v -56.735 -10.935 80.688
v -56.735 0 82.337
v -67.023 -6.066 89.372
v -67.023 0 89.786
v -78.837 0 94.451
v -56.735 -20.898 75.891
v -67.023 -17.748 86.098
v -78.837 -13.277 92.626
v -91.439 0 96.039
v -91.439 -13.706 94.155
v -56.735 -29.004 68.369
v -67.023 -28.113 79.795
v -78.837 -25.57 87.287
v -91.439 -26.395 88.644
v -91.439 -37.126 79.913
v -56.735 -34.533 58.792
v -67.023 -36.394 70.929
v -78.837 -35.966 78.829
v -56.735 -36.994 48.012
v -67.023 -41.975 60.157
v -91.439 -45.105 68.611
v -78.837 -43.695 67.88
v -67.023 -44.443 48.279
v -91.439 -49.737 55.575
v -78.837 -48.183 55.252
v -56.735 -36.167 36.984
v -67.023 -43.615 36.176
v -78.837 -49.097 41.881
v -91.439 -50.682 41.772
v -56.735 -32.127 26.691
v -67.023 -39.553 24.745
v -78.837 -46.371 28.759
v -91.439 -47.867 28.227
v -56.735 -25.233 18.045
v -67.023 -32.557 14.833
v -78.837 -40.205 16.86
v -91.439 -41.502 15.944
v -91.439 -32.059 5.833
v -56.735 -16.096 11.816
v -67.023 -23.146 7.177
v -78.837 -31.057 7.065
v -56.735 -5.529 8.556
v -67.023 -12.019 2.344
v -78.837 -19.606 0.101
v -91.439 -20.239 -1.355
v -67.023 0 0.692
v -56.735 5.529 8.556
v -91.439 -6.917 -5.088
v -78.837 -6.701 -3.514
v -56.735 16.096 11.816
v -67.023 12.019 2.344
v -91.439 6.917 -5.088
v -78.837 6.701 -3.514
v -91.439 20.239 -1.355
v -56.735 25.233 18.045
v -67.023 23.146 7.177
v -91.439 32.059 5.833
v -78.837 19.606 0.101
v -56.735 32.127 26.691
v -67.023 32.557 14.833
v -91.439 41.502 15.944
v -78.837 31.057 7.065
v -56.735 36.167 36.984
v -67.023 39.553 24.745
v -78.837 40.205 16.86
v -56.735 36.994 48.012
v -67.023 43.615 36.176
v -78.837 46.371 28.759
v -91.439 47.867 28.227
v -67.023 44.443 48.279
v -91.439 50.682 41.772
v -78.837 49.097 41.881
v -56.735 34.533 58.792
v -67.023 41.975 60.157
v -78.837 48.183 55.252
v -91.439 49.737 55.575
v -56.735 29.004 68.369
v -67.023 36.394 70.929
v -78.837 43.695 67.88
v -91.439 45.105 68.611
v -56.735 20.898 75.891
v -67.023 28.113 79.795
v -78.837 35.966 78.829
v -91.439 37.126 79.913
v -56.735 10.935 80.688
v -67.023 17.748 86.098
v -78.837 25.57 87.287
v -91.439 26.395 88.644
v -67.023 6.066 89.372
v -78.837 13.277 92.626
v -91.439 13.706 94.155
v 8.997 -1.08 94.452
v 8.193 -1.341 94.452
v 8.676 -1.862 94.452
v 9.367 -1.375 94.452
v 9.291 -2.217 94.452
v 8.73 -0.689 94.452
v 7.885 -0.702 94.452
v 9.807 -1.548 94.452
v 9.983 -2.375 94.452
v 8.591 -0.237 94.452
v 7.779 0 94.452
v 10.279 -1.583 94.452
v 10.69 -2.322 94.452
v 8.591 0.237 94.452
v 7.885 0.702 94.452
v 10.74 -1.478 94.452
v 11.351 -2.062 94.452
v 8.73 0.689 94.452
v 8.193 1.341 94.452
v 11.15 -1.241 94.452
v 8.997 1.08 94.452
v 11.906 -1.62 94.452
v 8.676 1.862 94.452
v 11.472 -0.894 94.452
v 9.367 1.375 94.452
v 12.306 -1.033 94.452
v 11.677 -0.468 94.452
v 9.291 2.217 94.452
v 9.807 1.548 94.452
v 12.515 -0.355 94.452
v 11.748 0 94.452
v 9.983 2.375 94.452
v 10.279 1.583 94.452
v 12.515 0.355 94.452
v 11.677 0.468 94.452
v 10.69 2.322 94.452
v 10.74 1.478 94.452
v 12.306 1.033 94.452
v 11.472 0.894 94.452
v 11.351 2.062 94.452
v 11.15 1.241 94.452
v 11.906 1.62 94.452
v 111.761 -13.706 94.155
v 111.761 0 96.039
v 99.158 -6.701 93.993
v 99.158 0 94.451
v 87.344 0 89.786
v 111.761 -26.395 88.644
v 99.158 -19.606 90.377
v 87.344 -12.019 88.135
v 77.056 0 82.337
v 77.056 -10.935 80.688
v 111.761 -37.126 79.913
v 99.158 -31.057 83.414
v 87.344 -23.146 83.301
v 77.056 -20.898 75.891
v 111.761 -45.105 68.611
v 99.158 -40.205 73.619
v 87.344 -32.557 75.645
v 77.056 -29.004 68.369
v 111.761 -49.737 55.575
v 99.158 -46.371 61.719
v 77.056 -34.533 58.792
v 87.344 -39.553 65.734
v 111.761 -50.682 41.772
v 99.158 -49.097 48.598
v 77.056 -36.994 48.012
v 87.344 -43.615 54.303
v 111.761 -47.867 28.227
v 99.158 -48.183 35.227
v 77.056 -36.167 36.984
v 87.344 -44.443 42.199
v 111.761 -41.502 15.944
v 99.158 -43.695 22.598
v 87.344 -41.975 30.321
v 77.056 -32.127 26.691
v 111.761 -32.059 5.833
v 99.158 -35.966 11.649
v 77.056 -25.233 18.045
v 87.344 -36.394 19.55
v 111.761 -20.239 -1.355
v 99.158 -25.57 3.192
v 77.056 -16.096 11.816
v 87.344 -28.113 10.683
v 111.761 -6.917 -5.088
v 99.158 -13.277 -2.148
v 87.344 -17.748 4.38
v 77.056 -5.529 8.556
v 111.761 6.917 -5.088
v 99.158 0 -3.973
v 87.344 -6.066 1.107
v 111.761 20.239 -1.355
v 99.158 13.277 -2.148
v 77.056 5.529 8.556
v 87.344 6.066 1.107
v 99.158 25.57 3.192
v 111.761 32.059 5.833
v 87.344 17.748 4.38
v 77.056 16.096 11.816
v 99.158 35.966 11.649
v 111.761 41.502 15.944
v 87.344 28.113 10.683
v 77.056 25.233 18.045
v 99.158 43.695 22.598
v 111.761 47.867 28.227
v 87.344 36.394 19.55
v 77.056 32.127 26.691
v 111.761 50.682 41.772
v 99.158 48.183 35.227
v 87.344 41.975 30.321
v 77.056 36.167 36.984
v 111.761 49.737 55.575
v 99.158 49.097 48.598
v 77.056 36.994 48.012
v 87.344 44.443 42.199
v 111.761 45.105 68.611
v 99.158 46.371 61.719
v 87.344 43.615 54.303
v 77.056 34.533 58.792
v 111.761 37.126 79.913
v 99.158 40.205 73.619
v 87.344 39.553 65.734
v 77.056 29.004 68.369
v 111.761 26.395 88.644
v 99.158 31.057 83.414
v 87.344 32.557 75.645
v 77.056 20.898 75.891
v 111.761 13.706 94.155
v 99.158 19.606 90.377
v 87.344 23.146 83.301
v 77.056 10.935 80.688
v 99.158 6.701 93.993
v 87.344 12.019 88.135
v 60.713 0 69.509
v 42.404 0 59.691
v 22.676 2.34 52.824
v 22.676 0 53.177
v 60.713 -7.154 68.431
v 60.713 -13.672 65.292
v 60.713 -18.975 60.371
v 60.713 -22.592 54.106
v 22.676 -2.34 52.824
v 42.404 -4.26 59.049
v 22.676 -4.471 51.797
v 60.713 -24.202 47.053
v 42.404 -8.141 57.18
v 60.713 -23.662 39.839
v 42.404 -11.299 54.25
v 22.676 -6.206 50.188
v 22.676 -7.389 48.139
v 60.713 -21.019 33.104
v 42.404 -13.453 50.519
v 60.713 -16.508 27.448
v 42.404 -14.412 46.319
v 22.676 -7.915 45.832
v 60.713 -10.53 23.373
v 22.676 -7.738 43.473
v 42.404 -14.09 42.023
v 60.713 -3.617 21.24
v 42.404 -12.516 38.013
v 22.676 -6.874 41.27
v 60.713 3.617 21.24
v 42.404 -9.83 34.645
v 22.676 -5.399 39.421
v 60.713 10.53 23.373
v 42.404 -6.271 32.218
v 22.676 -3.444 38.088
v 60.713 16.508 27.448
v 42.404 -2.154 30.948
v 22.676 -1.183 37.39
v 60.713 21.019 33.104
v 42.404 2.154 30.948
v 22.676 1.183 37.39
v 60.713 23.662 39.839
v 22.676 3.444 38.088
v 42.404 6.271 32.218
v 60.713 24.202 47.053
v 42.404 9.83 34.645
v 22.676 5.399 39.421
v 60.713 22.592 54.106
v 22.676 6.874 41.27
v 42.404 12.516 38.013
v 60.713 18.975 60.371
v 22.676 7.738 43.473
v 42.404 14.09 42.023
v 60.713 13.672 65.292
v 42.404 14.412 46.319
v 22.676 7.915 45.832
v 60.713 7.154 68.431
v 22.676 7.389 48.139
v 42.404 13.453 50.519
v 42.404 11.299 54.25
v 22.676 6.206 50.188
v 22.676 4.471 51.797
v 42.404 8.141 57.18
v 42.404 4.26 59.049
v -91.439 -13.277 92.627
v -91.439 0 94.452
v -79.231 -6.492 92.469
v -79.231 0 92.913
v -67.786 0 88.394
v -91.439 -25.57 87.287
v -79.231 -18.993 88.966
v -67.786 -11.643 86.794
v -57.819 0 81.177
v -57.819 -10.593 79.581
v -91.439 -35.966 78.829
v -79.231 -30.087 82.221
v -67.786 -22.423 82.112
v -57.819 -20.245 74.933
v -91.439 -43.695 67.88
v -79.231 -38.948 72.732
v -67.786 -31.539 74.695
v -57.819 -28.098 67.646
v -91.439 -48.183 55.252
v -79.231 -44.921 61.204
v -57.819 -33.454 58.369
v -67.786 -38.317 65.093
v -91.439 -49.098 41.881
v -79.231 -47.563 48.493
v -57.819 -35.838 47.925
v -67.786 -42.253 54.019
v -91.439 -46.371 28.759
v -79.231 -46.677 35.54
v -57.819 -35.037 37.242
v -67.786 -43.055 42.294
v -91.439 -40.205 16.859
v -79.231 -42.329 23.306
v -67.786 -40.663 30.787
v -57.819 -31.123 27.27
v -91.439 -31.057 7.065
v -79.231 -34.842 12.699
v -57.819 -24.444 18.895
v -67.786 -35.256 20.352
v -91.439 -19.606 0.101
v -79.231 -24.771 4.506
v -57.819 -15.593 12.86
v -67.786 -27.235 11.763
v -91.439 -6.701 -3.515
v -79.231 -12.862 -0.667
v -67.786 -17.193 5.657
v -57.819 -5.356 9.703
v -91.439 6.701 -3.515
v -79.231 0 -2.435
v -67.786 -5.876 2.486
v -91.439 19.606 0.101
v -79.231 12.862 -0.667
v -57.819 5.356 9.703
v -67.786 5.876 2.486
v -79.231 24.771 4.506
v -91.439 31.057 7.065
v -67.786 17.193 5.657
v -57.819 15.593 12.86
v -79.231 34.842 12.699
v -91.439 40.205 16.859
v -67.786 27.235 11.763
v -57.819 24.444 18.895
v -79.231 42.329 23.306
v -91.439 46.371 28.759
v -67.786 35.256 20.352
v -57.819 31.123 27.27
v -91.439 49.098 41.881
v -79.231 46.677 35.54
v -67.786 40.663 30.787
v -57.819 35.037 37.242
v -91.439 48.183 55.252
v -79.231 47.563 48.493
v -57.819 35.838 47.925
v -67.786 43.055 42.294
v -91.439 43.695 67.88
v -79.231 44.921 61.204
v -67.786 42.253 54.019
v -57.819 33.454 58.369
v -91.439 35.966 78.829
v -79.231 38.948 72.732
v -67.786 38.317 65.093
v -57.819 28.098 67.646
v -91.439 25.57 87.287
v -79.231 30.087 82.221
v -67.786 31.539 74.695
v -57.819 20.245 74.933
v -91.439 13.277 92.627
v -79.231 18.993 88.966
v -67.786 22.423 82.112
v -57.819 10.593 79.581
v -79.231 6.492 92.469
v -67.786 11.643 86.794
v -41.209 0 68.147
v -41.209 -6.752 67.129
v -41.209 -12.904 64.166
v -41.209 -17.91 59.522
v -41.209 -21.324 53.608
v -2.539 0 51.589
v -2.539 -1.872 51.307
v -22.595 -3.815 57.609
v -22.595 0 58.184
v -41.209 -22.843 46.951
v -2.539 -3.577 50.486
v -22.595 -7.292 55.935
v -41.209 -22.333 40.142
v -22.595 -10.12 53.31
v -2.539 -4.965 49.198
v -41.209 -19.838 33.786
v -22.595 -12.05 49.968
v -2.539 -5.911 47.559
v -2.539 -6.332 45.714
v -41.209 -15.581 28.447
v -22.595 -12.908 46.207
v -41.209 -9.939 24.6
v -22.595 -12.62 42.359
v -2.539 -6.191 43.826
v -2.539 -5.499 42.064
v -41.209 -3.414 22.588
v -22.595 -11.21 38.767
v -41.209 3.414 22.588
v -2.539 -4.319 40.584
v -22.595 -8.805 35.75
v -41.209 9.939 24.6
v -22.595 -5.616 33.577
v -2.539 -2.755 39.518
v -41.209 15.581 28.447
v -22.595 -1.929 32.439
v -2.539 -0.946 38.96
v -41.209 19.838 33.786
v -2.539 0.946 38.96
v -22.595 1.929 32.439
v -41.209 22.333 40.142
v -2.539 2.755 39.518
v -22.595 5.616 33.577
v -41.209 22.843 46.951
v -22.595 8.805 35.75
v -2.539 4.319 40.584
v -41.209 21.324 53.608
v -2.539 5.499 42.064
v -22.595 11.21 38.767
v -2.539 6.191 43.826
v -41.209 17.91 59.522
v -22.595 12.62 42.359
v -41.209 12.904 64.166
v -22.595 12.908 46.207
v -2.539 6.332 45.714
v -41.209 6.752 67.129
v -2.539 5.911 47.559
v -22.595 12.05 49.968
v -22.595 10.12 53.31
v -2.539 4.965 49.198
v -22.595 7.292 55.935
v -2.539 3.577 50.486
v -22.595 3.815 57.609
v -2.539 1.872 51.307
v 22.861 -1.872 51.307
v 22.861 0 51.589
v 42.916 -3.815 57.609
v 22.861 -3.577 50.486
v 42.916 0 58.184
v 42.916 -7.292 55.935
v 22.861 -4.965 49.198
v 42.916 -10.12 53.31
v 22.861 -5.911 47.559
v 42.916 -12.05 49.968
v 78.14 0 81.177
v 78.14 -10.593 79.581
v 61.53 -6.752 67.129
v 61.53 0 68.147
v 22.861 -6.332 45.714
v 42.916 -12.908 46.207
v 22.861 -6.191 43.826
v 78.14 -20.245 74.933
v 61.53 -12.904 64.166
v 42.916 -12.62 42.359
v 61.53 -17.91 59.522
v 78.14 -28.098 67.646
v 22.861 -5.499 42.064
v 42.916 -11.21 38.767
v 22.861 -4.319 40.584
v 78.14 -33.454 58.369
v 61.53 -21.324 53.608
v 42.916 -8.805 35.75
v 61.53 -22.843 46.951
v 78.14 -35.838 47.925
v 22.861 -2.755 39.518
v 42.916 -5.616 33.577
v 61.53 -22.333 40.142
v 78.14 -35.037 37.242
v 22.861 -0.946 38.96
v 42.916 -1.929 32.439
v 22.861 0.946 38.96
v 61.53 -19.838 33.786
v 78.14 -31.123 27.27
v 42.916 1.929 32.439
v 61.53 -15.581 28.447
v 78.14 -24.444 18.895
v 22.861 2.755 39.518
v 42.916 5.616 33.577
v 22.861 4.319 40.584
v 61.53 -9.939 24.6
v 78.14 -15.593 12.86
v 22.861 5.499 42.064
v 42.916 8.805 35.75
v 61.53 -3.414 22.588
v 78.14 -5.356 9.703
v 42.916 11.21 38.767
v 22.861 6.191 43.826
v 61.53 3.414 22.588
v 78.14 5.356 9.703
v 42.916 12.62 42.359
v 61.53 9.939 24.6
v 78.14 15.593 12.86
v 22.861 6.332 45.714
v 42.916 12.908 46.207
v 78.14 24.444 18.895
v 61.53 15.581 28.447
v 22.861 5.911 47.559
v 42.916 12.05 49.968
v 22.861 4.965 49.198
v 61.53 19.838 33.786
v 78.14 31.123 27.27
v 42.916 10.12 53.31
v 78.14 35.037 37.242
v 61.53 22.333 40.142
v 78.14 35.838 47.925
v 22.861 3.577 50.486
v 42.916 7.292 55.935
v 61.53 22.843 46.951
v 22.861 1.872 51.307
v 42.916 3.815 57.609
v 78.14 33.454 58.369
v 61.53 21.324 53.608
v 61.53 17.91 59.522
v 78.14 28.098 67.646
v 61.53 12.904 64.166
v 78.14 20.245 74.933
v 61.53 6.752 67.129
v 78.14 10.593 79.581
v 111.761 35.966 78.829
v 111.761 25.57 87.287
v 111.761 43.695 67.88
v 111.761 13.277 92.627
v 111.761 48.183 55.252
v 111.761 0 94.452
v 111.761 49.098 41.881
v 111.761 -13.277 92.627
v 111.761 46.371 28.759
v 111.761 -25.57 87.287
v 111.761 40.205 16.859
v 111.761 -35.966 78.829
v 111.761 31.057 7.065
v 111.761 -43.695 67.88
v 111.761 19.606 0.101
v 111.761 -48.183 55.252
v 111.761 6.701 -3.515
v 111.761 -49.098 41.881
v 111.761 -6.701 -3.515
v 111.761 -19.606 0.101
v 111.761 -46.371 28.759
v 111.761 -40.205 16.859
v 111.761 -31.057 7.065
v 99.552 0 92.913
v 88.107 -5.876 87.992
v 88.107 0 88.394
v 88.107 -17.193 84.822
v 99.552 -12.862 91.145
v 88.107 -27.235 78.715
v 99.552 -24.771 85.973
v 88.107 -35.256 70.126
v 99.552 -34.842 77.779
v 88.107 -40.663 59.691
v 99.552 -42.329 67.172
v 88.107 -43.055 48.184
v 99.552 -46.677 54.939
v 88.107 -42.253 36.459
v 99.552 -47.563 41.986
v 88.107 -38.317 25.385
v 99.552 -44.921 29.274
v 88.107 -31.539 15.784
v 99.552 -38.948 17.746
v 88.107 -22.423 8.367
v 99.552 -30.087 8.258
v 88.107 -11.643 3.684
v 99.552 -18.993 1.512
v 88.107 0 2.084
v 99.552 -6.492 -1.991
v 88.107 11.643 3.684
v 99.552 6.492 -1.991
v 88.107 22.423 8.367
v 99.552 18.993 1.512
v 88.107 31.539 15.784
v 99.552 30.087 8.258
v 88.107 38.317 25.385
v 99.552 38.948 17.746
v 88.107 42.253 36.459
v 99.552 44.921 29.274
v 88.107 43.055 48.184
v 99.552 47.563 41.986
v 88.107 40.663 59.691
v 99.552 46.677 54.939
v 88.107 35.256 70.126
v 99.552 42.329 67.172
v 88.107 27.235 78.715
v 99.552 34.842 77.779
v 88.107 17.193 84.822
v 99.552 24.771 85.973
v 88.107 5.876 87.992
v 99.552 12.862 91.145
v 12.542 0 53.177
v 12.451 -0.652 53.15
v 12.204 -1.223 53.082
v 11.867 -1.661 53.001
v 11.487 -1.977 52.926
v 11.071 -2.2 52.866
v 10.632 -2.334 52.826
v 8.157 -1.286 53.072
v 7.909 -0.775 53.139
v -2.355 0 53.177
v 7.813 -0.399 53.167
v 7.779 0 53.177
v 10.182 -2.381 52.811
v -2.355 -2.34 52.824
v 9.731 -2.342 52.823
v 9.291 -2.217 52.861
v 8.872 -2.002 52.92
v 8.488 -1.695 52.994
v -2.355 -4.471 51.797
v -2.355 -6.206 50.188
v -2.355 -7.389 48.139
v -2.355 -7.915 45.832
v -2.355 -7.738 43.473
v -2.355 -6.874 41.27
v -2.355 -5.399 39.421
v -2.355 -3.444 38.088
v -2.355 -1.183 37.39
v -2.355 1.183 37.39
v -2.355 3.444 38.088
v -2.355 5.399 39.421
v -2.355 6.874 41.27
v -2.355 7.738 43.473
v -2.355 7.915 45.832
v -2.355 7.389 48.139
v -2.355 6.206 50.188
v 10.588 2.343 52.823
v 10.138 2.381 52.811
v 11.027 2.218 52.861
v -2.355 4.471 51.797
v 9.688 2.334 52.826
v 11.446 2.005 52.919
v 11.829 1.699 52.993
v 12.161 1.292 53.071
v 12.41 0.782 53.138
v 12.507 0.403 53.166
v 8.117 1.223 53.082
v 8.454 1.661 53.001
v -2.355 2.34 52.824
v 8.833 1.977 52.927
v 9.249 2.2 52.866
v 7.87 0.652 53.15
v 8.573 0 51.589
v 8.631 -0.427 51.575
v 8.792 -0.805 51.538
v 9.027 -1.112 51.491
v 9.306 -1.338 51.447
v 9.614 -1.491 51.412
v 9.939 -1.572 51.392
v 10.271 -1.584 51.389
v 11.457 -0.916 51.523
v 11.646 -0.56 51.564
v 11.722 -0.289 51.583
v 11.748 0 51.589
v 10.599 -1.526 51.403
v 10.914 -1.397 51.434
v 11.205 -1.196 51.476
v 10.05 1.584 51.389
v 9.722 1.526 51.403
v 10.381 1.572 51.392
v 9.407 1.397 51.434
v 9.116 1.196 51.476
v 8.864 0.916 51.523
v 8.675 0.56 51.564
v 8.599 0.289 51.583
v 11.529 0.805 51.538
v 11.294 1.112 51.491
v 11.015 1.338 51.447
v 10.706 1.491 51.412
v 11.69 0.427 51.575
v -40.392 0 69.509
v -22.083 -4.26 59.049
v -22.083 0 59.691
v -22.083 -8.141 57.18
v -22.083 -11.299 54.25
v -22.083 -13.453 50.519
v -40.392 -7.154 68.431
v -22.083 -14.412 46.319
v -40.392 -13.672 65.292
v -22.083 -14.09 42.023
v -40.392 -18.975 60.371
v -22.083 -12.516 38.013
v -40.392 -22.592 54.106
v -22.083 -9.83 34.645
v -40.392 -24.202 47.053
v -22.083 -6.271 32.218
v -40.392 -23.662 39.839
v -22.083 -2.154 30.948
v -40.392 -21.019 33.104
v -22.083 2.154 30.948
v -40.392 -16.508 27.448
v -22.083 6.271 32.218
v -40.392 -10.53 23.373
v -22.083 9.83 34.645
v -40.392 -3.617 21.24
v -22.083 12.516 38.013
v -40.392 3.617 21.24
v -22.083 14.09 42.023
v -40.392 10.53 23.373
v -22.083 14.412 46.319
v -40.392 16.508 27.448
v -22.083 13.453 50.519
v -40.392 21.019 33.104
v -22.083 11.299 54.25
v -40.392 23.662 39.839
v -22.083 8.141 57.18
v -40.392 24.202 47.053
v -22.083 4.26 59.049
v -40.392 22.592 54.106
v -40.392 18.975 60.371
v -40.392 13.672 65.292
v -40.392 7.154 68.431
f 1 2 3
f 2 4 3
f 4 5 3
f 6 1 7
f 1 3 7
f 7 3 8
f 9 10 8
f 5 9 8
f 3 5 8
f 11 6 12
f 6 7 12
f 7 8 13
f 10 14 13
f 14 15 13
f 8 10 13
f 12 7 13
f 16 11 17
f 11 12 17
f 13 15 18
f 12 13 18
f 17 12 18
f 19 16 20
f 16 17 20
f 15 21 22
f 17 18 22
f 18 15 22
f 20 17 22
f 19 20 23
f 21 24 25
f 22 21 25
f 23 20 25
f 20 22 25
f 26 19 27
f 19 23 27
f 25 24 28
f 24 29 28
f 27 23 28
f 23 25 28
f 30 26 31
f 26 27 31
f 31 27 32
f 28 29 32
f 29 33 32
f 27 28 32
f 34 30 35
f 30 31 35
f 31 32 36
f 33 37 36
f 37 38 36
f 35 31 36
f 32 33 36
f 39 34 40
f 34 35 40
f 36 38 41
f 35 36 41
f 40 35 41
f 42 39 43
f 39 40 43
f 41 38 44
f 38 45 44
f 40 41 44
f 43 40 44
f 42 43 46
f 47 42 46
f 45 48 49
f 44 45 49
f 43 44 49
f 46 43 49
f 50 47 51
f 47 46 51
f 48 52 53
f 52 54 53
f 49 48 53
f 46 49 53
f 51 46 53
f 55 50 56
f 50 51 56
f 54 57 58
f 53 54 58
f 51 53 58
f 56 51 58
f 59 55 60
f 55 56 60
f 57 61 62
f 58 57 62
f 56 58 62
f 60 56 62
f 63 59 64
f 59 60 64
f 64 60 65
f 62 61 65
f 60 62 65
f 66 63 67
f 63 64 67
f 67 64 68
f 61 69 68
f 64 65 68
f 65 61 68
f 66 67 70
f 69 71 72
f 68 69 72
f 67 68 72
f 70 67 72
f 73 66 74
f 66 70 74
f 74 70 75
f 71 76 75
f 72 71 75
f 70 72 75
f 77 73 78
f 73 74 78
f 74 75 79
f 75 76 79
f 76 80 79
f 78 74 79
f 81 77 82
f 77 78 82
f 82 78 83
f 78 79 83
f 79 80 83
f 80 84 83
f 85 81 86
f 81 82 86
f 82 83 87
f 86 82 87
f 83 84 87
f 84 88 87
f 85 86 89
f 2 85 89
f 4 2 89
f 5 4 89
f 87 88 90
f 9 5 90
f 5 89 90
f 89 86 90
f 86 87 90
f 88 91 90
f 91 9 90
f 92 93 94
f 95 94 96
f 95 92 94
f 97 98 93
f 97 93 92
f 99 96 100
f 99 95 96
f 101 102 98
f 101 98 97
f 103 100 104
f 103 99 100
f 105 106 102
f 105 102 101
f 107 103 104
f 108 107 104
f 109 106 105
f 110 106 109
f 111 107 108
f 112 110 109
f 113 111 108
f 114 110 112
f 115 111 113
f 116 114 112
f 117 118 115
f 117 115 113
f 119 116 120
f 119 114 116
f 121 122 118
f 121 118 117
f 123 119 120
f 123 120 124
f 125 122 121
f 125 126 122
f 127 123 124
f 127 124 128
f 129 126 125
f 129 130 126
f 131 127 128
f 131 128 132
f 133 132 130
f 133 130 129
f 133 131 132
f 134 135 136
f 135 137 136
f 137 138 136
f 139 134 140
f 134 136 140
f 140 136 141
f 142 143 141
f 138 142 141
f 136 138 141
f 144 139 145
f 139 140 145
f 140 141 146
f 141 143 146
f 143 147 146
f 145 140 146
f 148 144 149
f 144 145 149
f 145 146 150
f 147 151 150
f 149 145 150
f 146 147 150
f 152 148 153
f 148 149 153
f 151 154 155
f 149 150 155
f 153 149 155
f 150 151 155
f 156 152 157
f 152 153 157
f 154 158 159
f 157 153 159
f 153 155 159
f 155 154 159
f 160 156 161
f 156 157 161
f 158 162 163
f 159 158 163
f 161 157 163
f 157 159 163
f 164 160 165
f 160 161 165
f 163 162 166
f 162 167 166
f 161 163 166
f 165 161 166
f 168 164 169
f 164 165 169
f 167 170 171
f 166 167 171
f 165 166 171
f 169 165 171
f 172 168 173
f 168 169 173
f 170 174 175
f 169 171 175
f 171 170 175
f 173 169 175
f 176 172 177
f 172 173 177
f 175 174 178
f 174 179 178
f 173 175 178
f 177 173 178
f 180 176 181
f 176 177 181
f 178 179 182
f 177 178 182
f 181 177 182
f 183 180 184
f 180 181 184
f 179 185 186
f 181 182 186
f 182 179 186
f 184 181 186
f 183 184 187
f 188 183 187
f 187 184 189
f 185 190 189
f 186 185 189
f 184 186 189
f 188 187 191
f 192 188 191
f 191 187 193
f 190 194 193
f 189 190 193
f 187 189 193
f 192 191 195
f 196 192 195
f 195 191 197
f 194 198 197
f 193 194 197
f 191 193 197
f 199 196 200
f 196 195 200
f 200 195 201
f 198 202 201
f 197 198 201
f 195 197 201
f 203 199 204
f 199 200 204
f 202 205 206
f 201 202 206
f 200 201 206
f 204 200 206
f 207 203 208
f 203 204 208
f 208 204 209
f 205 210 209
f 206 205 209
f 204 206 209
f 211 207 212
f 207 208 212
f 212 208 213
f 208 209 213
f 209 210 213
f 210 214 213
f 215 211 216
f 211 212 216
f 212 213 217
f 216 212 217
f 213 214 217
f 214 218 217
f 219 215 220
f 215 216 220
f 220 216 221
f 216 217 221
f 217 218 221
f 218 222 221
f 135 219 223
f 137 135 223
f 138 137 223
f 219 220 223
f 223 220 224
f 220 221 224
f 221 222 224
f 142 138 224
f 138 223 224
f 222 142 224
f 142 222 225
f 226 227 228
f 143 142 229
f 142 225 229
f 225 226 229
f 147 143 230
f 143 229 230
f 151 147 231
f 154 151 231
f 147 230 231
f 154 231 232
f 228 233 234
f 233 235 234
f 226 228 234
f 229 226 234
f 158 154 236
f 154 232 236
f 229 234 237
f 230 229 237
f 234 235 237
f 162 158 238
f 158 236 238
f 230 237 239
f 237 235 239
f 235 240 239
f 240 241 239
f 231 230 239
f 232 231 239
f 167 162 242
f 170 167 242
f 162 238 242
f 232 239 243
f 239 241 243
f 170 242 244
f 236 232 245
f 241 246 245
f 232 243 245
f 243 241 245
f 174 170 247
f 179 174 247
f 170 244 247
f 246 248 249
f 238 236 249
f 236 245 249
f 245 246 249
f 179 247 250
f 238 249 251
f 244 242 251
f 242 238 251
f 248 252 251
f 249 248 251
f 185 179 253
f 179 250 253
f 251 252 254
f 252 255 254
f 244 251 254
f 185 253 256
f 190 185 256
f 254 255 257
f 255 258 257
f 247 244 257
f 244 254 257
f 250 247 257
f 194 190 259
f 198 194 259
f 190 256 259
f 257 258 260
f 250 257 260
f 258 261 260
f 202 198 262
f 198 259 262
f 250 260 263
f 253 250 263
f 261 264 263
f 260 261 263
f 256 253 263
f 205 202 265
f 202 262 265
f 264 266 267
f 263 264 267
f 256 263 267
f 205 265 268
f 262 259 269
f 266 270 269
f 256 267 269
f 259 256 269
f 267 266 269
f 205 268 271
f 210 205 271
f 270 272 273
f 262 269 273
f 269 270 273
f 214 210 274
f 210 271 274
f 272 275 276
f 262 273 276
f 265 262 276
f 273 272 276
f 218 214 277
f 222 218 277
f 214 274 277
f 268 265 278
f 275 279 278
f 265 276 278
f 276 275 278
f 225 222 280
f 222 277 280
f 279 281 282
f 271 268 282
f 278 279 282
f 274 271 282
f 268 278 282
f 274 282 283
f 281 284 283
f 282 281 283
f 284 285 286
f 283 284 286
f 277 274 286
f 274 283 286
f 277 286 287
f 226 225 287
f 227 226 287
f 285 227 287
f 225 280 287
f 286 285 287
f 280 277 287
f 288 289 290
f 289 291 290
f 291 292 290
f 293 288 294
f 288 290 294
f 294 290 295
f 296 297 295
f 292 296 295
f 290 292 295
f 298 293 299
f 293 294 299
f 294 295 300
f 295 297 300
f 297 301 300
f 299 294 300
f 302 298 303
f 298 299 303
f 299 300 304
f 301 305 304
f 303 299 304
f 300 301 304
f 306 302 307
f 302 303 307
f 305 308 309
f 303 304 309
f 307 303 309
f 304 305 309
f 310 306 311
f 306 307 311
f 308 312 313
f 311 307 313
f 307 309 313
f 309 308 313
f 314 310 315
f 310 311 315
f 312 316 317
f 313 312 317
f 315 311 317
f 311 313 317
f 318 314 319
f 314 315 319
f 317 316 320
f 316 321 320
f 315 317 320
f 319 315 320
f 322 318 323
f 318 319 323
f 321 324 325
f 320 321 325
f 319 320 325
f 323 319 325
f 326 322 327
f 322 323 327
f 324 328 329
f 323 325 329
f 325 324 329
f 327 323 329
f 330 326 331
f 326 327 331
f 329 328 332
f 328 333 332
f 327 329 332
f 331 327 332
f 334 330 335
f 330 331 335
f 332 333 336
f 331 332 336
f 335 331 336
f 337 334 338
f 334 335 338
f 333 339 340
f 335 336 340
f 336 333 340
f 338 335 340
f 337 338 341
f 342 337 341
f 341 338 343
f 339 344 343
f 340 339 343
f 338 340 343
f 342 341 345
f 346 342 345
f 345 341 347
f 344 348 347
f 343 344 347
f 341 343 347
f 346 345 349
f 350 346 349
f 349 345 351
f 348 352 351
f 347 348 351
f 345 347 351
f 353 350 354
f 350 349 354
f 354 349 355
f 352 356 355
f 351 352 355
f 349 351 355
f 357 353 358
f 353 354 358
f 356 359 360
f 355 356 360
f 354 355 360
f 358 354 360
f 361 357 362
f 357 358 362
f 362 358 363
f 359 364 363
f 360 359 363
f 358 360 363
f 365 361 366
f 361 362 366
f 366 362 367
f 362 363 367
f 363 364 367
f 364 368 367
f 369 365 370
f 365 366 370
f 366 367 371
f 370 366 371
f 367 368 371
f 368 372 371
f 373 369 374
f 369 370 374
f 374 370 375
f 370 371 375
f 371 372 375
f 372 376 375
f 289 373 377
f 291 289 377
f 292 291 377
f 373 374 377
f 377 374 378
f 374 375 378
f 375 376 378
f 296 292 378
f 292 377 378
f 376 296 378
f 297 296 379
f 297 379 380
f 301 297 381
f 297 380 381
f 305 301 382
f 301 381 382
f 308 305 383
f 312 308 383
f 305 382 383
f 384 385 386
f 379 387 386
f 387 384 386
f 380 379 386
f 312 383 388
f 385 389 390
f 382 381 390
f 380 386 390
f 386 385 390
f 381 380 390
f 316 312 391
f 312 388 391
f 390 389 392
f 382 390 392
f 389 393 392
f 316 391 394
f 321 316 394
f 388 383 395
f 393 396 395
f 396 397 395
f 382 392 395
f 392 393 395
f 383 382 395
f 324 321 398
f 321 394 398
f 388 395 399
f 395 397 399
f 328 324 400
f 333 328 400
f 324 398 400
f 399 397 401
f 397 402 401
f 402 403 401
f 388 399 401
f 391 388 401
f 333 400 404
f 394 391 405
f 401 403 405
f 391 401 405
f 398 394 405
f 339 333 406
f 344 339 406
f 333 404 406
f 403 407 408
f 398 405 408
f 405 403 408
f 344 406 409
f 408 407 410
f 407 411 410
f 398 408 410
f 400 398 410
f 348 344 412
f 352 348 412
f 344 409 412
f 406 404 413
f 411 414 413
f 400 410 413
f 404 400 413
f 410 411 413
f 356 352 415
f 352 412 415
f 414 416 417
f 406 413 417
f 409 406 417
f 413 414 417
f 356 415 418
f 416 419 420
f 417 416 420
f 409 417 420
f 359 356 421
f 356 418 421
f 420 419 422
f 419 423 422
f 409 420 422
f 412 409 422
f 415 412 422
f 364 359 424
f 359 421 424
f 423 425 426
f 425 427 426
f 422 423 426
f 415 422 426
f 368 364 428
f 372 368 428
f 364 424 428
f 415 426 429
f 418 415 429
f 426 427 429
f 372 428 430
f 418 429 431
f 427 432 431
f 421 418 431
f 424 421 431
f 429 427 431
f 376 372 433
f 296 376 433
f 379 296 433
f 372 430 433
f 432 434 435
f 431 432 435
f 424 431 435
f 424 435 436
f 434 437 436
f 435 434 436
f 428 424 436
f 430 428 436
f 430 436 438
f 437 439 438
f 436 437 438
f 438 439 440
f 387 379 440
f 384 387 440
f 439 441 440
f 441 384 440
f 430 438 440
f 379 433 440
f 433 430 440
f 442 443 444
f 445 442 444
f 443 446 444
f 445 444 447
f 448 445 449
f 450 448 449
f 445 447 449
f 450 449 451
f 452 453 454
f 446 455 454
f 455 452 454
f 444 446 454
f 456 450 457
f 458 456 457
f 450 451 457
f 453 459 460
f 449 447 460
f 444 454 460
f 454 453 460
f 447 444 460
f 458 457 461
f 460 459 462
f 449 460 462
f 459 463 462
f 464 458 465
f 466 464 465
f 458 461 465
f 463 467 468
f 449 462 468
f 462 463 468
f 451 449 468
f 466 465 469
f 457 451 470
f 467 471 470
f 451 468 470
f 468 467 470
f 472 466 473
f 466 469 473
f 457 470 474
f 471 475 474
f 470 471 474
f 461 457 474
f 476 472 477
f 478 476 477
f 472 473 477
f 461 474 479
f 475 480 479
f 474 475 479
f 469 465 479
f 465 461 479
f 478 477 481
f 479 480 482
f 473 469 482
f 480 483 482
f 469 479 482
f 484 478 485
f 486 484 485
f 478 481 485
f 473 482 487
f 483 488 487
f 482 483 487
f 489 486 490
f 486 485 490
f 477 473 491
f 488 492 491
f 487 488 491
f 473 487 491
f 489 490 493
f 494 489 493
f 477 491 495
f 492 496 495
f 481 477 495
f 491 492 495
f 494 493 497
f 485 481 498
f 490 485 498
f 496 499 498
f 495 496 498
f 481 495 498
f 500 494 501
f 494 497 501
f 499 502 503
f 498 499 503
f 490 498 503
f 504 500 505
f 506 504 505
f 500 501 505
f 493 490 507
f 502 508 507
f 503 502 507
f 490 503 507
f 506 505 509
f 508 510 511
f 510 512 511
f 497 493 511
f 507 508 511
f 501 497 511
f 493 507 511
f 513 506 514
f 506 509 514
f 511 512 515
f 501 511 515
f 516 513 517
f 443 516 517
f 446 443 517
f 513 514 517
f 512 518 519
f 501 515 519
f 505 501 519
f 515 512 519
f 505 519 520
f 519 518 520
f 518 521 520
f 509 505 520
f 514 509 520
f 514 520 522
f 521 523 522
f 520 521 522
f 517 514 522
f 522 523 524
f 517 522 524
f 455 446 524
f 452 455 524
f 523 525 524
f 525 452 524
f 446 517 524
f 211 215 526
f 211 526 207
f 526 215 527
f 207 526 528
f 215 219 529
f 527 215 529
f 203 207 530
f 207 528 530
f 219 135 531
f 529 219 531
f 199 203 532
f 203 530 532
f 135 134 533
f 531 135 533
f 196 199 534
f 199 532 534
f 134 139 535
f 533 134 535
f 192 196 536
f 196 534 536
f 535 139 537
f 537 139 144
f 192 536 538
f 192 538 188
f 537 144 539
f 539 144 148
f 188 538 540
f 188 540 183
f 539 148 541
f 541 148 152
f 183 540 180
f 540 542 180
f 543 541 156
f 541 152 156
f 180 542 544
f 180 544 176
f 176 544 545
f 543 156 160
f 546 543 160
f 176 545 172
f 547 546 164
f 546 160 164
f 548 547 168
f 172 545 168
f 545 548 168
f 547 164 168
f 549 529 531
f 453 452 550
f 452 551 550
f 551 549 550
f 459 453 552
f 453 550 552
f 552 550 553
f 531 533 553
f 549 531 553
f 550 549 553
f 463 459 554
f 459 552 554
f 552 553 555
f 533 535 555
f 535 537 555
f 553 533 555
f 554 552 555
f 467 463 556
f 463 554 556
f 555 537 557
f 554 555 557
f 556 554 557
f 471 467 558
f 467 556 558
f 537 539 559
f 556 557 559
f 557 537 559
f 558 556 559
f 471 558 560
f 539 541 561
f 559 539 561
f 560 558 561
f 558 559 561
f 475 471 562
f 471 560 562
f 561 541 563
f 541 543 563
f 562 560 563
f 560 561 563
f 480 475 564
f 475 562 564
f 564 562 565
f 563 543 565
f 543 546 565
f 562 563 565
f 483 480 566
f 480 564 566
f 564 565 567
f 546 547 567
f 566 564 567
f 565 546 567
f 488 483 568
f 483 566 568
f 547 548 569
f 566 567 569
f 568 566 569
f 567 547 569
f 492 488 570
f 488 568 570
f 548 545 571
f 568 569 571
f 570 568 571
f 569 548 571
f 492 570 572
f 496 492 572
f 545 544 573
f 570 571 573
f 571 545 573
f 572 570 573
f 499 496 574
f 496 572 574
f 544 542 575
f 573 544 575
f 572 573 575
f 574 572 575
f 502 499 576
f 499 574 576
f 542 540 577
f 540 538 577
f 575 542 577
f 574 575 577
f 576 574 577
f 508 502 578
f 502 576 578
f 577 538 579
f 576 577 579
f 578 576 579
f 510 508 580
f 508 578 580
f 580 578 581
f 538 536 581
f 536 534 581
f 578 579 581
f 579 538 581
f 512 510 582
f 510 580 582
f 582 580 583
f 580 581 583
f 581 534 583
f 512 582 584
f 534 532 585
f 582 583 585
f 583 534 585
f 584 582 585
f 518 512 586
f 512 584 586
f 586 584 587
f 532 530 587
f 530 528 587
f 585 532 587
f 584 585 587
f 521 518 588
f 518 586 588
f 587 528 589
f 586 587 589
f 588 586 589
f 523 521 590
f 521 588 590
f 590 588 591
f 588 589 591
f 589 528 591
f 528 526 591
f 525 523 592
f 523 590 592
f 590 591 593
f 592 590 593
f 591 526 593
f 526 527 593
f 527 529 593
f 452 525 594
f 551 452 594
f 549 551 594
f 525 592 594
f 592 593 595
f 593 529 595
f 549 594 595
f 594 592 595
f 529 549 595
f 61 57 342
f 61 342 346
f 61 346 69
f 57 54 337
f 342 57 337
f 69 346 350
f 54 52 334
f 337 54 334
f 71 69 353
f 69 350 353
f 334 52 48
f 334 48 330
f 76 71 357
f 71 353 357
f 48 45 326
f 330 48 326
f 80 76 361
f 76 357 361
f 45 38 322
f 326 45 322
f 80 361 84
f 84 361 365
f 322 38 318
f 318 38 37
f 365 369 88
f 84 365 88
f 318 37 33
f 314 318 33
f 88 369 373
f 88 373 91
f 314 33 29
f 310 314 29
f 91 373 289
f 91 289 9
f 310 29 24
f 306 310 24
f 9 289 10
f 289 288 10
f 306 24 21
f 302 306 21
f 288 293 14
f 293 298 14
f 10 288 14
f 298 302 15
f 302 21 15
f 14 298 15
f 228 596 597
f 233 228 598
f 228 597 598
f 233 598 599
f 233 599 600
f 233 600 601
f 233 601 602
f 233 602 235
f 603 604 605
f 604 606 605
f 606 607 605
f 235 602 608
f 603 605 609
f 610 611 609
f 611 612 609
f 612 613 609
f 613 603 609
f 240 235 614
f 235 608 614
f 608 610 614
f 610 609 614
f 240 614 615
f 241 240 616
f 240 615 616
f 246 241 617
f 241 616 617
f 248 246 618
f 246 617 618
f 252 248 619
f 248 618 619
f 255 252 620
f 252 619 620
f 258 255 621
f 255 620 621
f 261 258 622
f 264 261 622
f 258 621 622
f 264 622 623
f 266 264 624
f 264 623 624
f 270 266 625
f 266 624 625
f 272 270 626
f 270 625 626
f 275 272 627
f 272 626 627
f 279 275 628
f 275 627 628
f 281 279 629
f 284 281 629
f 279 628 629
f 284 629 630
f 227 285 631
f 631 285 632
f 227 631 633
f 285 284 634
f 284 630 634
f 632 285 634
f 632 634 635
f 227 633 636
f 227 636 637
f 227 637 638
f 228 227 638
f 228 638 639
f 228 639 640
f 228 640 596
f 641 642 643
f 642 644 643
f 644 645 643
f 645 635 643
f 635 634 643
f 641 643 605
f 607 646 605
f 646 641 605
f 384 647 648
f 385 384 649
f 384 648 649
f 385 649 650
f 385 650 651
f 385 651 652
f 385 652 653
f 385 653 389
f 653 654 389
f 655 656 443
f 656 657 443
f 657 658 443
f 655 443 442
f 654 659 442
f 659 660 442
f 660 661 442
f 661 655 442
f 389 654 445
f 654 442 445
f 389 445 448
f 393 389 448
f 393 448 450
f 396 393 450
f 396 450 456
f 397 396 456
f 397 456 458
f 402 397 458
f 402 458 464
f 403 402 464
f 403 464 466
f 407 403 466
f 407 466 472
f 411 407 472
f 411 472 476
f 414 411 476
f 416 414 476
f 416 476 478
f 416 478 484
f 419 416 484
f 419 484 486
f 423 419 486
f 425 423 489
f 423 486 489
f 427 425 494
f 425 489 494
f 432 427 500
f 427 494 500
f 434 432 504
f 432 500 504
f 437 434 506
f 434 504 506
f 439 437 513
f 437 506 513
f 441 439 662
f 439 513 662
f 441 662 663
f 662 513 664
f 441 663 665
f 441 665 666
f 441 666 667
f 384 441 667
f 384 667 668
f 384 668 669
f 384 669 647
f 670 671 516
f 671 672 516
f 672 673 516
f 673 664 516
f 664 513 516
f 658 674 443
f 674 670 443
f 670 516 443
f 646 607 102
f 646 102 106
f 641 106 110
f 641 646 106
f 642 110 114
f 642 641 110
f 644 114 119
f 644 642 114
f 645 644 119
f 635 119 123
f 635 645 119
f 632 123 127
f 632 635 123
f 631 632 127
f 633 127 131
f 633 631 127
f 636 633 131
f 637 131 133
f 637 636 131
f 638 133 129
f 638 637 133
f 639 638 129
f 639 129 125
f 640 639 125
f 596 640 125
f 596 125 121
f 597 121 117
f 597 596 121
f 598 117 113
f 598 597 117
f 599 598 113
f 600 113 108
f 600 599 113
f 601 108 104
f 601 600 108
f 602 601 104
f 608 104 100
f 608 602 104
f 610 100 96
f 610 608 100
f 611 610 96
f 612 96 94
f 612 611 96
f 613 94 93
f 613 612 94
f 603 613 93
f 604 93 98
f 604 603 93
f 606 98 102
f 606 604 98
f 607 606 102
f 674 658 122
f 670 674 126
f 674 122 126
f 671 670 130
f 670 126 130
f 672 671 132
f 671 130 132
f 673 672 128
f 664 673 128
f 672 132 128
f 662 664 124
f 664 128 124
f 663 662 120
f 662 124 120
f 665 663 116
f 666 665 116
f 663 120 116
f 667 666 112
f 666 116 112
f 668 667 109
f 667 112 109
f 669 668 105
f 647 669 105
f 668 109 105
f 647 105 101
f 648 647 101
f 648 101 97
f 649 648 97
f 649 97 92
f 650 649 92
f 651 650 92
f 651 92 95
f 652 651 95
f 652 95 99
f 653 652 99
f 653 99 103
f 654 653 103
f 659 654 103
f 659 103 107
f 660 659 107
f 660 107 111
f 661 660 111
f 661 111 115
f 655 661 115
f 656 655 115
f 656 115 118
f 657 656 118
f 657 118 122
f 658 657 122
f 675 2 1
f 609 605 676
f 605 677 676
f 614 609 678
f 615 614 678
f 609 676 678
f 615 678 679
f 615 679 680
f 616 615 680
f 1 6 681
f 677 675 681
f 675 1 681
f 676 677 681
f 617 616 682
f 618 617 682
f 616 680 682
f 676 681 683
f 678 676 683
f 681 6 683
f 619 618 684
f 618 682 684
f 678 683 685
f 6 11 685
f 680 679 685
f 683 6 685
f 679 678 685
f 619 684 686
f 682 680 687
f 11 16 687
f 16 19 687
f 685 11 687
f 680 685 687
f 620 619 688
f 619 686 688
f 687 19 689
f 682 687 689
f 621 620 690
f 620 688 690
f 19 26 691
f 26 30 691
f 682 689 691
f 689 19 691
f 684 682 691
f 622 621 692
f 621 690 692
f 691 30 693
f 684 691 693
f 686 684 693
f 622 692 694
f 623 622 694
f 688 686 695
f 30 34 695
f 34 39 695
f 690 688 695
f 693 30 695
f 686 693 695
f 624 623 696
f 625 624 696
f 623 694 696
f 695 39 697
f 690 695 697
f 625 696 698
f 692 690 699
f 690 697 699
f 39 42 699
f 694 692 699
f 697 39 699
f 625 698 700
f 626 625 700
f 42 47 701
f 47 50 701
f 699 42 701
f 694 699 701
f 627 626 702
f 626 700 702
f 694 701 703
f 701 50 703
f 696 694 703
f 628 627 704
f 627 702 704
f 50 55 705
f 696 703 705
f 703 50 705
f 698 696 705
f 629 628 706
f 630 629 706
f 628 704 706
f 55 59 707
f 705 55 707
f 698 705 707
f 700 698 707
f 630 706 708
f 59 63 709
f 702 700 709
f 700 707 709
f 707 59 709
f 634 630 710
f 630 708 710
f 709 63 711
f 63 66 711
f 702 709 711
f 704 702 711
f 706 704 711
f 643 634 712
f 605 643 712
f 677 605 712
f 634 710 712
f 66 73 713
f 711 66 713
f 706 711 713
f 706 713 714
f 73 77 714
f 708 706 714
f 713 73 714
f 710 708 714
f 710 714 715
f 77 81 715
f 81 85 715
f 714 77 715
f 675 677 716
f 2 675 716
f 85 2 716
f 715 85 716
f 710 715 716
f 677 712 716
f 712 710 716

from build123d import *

# Parameters (mm, degrees)
F7_R     = 1.5875
F8_DEPTH = 44.45


# Not quite as in the source:
# - a length typed as a fraction of an inch, garbled in the dataset ("3 / 203.2 mm" for 3/8 in), is restored
# - a feature names something its author has since deleted; it is built from what else it names


with BuildPart() as f5:
    # F4 (on Front) → F5 (revolve)
    with BuildSketch(Plane.XZ):
        with BuildLine():
            ThreePointArc((-57.8191946572, 81.1773013498), (-32.1183318105, 62.7606186977), (-2.5394843148, 51.5892118125))
            Line((-2.5394843148, 51.5892118125), (7.7792656852, 51.5892118125))
            Line((7.7792656852, 51.5892118125), (7.7792656852, 53.1767118125))
            Line((7.7792656852, 53.1767118125), (-2.3548589537, 53.1767118125))
            ThreePointArc((-2.3548589537, 53.1767118125), (-31.4500310941, 64.2035504476), (-56.7346691844, 82.3365945607))
            ThreePointArc((-56.7346691844, 82.3365945607), (-72.7834805037, 92.4895400844), (-91.4394843148, 96.0392118125))
            Line((-91.4394843148, 96.0392118125), (-91.4394843148, 94.4517118125))
            ThreePointArc((-91.4394843148, 94.4517118125), (-73.3664806228, 91.0129673259), (-57.8191946572, 81.1773013498))
        make_face()
        with BuildLine():
            Line((10.1605156852, 53.1767118125), (10.1605156852, 51.5892118125))
            Line((10.1605156852, 51.5892118125), (22.8605156852, 51.5892118125))
            ThreePointArc((22.8605156852, 51.5892118125), (52.439363181, 62.7606186977), (78.1402260277, 81.1773013498))
            ThreePointArc((78.1402260277, 81.1773013498), (93.6875119933, 91.0129673259), (111.7605156852, 94.4517118125))
            Line((111.7605156852, 94.4517118125), (111.7605156852, 96.0392118125))
            ThreePointArc((111.7605156852, 96.0392118125), (93.1045118742, 92.4895400844), (77.0557005549, 82.3365945607))
            ThreePointArc((77.0557005549, 82.3365945607), (51.7710624646, 64.2035504476), (22.6758903242, 53.1767118125))
            Line((22.6758903242, 53.1767118125), (10.3451410463, 53.1767118125))
            Line((10.3451410463, 53.1767118125), (10.1605156852, 53.1767118125))
        make_face()
        Polygon((7.7792656852, 53.1767118125), (7.7792656852, 51.5892118125), (10.1605156852, 51.5892118125), (10.1605156852, 53.1767118125), (9.9758903242, 53.1767118125), align=None)
    revolve(axis=Axis((-40.6394843148, 0, 45.2392118125), (1, 0, 0)))

    # F4 (on Front) → F6 (revolve)
    with BuildSketch(Plane.XZ):
        Polygon((7.7792656852, 94.4517118125), (7.7792656852, 53.1767118125), (9.9758903242, 53.1767118125), (10.1605156852, 53.1767118125), (10.1605156852, 94.4517118125), align=None)
        Polygon((7.7792656852, 53.1767118125), (7.7792656852, 51.5892118125), (10.1605156852, 51.5892118125), (10.1605156852, 53.1767118125), (9.9758903242, 53.1767118125), align=None)
    revolve(axis=Axis((10.1605156852, 0, 73.0204618125), (0, 0, -1)))

    # F7 (on face) → F8 (cut)
    with BuildSketch(Plane.XY.offset(94.4517118125)):
        with Locations((10.1605156852, 0)):
            Circle(F7_R)
    extrude(amount=-F8_DEPTH, mode=Mode.SUBTRACT)


solid = f5.part
